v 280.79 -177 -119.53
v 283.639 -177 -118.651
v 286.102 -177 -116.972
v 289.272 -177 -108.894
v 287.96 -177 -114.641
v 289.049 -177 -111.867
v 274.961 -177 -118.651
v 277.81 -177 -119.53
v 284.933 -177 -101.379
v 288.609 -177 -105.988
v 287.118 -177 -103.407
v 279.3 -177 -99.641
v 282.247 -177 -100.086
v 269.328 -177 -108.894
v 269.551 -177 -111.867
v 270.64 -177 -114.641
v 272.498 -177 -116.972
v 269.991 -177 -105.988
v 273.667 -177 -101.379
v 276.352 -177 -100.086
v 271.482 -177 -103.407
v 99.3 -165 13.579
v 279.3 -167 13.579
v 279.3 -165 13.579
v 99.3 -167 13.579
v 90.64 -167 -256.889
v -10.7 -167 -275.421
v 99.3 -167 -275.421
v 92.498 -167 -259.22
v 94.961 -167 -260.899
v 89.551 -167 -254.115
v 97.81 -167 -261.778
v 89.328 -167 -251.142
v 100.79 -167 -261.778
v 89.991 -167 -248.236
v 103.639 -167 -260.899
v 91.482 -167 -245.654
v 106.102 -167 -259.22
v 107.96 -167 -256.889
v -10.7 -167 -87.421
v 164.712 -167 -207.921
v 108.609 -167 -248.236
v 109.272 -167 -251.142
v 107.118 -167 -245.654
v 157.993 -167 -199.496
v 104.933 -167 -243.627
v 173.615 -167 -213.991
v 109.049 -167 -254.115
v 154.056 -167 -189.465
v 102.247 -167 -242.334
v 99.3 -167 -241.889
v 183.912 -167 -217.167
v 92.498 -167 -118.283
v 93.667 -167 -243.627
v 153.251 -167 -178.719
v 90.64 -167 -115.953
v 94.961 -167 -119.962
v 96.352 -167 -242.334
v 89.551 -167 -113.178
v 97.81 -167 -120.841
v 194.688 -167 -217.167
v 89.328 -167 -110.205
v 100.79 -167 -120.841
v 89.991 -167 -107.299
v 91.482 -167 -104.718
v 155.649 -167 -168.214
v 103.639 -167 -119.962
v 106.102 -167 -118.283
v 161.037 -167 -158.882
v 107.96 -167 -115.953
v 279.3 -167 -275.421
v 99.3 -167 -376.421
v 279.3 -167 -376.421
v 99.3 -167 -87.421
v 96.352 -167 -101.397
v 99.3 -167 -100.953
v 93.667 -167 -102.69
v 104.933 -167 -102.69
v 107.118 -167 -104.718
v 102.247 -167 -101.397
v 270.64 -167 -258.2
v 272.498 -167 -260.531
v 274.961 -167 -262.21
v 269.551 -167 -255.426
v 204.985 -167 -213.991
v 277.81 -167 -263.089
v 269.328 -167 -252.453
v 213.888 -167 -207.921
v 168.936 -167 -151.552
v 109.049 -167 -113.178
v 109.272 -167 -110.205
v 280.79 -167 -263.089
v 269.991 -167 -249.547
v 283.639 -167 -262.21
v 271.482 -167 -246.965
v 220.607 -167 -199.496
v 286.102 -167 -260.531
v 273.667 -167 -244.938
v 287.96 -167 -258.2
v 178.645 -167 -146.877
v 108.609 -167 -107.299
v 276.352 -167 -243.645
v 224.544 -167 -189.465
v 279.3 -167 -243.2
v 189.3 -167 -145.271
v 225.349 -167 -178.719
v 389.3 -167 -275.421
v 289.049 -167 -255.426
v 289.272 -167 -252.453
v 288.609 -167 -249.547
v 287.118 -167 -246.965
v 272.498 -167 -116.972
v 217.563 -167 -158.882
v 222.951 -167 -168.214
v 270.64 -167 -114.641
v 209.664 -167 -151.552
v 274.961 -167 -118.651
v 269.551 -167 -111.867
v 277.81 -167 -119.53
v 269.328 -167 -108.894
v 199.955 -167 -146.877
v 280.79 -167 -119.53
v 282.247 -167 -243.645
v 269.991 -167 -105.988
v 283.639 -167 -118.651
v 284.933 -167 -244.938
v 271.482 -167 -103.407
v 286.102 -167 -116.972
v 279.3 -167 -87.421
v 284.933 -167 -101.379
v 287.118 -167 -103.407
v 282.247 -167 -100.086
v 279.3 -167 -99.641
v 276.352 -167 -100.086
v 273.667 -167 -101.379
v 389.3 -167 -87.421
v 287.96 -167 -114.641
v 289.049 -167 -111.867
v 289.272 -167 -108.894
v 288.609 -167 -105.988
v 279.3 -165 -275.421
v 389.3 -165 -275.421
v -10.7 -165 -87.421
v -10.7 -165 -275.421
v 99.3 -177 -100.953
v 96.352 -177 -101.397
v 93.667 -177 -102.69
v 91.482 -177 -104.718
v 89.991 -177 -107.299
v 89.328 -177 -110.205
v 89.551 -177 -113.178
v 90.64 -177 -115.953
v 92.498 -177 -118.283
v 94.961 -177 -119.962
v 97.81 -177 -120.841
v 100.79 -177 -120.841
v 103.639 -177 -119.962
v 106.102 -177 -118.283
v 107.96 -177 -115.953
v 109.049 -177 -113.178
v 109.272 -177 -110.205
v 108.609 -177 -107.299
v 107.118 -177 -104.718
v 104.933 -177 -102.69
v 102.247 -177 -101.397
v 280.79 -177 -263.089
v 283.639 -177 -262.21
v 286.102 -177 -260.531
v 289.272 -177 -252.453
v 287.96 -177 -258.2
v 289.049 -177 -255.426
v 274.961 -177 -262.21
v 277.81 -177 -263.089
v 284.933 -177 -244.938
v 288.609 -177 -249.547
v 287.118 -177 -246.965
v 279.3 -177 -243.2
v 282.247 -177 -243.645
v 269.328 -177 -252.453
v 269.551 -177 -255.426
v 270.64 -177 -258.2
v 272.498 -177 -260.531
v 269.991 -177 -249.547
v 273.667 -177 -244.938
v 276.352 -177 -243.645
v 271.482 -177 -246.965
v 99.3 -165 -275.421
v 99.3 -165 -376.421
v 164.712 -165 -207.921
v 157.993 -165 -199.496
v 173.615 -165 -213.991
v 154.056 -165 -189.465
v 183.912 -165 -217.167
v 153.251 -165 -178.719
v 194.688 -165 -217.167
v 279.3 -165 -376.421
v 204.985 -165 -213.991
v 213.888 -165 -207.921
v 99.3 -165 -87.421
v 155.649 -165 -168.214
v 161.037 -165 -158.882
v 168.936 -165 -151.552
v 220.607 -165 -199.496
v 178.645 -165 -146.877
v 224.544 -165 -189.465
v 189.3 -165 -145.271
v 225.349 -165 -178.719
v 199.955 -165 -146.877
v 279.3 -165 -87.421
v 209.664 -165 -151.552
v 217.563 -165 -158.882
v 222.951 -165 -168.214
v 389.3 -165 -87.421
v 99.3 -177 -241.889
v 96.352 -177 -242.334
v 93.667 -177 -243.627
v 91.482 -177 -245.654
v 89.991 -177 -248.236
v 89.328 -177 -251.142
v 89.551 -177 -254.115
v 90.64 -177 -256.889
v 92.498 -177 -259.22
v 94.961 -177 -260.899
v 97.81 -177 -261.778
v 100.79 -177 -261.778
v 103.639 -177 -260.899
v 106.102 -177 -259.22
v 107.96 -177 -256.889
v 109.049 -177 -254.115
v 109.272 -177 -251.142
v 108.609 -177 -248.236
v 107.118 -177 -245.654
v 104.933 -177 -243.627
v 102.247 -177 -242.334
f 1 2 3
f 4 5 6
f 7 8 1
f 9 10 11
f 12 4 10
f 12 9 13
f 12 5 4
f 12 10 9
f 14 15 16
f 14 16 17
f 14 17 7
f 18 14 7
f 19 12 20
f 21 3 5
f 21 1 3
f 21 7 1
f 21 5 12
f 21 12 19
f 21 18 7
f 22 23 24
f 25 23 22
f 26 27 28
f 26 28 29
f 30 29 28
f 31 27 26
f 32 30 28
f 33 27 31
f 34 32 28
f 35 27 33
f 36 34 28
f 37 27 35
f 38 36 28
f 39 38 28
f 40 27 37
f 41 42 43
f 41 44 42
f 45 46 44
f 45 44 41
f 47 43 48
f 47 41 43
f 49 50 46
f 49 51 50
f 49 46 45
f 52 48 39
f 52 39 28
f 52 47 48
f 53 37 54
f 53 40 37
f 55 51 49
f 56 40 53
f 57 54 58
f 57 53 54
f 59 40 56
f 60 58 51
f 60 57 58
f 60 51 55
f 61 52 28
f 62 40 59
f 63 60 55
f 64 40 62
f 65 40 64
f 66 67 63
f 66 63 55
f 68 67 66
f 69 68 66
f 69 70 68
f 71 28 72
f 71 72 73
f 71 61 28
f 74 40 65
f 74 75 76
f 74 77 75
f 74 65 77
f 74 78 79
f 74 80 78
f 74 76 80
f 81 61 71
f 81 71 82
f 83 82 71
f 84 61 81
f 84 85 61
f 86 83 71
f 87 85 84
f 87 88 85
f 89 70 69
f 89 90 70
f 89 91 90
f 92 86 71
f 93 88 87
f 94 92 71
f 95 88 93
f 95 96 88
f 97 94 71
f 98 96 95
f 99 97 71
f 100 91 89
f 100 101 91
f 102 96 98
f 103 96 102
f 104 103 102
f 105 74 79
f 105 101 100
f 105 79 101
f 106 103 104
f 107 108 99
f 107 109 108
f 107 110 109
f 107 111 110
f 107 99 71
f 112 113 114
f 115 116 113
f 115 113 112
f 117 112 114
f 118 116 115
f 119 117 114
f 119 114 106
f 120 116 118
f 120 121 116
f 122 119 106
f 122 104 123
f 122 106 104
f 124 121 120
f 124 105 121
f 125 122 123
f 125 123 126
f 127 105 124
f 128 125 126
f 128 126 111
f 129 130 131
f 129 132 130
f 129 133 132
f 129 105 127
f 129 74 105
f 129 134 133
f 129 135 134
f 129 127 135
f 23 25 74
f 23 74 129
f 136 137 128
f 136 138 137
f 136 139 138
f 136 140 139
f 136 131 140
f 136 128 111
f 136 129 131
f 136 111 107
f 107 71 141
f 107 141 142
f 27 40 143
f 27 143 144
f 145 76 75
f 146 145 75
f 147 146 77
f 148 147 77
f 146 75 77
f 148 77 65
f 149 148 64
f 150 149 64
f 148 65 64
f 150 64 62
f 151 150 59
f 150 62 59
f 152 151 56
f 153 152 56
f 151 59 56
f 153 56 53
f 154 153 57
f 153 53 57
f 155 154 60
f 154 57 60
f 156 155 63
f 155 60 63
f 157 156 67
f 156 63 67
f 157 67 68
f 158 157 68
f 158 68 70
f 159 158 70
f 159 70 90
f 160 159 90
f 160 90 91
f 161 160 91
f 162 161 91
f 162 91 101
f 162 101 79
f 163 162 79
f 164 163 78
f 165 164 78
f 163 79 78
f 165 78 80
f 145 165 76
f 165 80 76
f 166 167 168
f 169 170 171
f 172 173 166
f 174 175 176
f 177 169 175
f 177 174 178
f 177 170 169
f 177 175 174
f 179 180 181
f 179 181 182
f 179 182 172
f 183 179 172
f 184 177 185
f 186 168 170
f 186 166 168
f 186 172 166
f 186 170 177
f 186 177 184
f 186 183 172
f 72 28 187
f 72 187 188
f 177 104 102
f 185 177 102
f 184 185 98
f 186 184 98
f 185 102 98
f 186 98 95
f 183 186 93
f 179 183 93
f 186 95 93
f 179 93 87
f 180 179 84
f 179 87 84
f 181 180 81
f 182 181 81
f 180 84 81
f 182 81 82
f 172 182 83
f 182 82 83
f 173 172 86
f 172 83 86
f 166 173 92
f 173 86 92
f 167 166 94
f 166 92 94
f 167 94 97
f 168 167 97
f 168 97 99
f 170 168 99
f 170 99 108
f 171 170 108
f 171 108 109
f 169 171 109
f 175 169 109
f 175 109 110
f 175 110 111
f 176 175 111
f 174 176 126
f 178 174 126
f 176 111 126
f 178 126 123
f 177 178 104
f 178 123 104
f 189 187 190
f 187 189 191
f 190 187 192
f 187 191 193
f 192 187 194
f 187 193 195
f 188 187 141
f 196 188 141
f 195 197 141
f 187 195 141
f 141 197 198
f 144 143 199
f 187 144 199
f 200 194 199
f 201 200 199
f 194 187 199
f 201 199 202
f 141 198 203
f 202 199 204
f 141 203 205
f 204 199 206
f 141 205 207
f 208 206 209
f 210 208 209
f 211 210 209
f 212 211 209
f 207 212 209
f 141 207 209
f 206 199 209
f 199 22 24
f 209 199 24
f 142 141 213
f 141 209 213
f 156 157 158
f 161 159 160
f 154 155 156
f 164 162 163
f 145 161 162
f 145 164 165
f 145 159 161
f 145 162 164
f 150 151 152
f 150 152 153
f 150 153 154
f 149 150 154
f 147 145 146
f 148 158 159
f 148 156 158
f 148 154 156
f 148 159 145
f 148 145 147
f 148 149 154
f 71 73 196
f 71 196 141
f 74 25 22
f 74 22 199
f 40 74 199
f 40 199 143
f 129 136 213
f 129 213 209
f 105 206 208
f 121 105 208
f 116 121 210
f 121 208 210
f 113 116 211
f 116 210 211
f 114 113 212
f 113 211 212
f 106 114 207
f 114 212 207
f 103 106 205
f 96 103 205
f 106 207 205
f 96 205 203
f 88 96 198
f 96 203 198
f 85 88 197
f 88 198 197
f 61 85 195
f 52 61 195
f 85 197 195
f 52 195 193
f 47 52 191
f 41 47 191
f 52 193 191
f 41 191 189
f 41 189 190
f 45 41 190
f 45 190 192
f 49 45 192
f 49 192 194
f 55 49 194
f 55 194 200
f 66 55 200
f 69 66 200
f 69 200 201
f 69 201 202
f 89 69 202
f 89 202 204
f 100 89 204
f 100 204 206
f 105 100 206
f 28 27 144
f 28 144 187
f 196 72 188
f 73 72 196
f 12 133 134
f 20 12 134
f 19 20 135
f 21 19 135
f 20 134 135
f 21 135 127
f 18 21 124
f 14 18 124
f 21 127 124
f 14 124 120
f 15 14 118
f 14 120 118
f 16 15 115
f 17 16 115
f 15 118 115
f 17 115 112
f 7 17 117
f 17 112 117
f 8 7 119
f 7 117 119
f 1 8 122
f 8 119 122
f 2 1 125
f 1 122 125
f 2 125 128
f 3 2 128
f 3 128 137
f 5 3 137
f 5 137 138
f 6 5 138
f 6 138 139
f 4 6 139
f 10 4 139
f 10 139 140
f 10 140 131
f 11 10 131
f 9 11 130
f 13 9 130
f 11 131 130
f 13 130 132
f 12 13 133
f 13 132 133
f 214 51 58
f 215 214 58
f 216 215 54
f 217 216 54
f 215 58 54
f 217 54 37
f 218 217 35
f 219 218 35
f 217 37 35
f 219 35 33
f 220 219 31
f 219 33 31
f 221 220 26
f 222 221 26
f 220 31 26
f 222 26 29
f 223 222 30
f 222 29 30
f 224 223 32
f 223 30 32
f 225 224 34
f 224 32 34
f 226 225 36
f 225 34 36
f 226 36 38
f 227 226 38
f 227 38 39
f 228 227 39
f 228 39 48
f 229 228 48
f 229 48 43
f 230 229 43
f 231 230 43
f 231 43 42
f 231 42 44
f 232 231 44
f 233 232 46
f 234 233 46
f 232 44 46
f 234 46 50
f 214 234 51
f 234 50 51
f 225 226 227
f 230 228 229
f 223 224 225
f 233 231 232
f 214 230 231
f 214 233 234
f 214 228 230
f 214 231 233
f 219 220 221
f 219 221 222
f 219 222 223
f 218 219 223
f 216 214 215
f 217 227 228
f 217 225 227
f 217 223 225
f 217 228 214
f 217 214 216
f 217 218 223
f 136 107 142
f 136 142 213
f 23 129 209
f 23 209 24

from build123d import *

# Parameters (mm, degrees)
BOSS_EXTRUDE1_DEPTH = 2
SKETCH2_R           = 36.15
CUT_EXTRUDE1_DEPTH  = 542.526676351
SKETCH3_R           = 10
BOSS_EXTRUDE2_DEPTH = 10


with BuildPart() as part:
    # Sketch1 → Boss-Extrude1 (new body)
    with BuildSketch(Plane.XZ.offset(167)):
        Polygon((279.299936853, -275.420908514), (389.299936853, -275.420908514), (389.299936853, -87.420908514), (279.299936853, -87.420908514), (279.299936853, 13.579091486), (99.299936853, 13.579091486), (99.299936853, -87.420908514), (-10.700063147, -87.420908514), (-10.700063147, -275.420908514), (99.299936853, -275.420908514), (99.299936853, -376.420908514), (279.299936853, -376.420908514), align=None)
    extrude(amount=-BOSS_EXTRUDE1_DEPTH)

    # Sketch2 → Cut-Extrude1 (cut, through all)
    with BuildSketch(Plane(origin=(0, -165, 0), x_dir=(1, 0, 0), z_dir=(0, 1, 0))):
        with Locations(Location((189.299936853, 181.420908514, 0), (0, 0, 270))):
            Circle(SKETCH2_R)
    extrude(amount=-CUT_EXTRUDE1_DEPTH, mode=Mode.SUBTRACT)

    # Sketch3 → Boss-Extrude2 (add)
    with BuildSketch(Plane.XZ.offset(167)):
        with Locations(Location((99.299936853, -110.952514015, 0), (0, 0, 90))):
            Circle(SKETCH3_R)
        with Locations(Location((279.299936853, -109.641474118, 0), (0, 0, 90))):
            Circle(SKETCH3_R)
        with Locations(Location((279.299936853, -253.20034291, 0), (0, 0, 90))):
            Circle(SKETCH3_R)
        with Locations(Location((99.299936853, -251.889303012, 0), (0, 0, 90))):
            Circle(SKETCH3_R)
    extrude(amount=BOSS_EXTRUDE2_DEPTH)


solid = part.part
